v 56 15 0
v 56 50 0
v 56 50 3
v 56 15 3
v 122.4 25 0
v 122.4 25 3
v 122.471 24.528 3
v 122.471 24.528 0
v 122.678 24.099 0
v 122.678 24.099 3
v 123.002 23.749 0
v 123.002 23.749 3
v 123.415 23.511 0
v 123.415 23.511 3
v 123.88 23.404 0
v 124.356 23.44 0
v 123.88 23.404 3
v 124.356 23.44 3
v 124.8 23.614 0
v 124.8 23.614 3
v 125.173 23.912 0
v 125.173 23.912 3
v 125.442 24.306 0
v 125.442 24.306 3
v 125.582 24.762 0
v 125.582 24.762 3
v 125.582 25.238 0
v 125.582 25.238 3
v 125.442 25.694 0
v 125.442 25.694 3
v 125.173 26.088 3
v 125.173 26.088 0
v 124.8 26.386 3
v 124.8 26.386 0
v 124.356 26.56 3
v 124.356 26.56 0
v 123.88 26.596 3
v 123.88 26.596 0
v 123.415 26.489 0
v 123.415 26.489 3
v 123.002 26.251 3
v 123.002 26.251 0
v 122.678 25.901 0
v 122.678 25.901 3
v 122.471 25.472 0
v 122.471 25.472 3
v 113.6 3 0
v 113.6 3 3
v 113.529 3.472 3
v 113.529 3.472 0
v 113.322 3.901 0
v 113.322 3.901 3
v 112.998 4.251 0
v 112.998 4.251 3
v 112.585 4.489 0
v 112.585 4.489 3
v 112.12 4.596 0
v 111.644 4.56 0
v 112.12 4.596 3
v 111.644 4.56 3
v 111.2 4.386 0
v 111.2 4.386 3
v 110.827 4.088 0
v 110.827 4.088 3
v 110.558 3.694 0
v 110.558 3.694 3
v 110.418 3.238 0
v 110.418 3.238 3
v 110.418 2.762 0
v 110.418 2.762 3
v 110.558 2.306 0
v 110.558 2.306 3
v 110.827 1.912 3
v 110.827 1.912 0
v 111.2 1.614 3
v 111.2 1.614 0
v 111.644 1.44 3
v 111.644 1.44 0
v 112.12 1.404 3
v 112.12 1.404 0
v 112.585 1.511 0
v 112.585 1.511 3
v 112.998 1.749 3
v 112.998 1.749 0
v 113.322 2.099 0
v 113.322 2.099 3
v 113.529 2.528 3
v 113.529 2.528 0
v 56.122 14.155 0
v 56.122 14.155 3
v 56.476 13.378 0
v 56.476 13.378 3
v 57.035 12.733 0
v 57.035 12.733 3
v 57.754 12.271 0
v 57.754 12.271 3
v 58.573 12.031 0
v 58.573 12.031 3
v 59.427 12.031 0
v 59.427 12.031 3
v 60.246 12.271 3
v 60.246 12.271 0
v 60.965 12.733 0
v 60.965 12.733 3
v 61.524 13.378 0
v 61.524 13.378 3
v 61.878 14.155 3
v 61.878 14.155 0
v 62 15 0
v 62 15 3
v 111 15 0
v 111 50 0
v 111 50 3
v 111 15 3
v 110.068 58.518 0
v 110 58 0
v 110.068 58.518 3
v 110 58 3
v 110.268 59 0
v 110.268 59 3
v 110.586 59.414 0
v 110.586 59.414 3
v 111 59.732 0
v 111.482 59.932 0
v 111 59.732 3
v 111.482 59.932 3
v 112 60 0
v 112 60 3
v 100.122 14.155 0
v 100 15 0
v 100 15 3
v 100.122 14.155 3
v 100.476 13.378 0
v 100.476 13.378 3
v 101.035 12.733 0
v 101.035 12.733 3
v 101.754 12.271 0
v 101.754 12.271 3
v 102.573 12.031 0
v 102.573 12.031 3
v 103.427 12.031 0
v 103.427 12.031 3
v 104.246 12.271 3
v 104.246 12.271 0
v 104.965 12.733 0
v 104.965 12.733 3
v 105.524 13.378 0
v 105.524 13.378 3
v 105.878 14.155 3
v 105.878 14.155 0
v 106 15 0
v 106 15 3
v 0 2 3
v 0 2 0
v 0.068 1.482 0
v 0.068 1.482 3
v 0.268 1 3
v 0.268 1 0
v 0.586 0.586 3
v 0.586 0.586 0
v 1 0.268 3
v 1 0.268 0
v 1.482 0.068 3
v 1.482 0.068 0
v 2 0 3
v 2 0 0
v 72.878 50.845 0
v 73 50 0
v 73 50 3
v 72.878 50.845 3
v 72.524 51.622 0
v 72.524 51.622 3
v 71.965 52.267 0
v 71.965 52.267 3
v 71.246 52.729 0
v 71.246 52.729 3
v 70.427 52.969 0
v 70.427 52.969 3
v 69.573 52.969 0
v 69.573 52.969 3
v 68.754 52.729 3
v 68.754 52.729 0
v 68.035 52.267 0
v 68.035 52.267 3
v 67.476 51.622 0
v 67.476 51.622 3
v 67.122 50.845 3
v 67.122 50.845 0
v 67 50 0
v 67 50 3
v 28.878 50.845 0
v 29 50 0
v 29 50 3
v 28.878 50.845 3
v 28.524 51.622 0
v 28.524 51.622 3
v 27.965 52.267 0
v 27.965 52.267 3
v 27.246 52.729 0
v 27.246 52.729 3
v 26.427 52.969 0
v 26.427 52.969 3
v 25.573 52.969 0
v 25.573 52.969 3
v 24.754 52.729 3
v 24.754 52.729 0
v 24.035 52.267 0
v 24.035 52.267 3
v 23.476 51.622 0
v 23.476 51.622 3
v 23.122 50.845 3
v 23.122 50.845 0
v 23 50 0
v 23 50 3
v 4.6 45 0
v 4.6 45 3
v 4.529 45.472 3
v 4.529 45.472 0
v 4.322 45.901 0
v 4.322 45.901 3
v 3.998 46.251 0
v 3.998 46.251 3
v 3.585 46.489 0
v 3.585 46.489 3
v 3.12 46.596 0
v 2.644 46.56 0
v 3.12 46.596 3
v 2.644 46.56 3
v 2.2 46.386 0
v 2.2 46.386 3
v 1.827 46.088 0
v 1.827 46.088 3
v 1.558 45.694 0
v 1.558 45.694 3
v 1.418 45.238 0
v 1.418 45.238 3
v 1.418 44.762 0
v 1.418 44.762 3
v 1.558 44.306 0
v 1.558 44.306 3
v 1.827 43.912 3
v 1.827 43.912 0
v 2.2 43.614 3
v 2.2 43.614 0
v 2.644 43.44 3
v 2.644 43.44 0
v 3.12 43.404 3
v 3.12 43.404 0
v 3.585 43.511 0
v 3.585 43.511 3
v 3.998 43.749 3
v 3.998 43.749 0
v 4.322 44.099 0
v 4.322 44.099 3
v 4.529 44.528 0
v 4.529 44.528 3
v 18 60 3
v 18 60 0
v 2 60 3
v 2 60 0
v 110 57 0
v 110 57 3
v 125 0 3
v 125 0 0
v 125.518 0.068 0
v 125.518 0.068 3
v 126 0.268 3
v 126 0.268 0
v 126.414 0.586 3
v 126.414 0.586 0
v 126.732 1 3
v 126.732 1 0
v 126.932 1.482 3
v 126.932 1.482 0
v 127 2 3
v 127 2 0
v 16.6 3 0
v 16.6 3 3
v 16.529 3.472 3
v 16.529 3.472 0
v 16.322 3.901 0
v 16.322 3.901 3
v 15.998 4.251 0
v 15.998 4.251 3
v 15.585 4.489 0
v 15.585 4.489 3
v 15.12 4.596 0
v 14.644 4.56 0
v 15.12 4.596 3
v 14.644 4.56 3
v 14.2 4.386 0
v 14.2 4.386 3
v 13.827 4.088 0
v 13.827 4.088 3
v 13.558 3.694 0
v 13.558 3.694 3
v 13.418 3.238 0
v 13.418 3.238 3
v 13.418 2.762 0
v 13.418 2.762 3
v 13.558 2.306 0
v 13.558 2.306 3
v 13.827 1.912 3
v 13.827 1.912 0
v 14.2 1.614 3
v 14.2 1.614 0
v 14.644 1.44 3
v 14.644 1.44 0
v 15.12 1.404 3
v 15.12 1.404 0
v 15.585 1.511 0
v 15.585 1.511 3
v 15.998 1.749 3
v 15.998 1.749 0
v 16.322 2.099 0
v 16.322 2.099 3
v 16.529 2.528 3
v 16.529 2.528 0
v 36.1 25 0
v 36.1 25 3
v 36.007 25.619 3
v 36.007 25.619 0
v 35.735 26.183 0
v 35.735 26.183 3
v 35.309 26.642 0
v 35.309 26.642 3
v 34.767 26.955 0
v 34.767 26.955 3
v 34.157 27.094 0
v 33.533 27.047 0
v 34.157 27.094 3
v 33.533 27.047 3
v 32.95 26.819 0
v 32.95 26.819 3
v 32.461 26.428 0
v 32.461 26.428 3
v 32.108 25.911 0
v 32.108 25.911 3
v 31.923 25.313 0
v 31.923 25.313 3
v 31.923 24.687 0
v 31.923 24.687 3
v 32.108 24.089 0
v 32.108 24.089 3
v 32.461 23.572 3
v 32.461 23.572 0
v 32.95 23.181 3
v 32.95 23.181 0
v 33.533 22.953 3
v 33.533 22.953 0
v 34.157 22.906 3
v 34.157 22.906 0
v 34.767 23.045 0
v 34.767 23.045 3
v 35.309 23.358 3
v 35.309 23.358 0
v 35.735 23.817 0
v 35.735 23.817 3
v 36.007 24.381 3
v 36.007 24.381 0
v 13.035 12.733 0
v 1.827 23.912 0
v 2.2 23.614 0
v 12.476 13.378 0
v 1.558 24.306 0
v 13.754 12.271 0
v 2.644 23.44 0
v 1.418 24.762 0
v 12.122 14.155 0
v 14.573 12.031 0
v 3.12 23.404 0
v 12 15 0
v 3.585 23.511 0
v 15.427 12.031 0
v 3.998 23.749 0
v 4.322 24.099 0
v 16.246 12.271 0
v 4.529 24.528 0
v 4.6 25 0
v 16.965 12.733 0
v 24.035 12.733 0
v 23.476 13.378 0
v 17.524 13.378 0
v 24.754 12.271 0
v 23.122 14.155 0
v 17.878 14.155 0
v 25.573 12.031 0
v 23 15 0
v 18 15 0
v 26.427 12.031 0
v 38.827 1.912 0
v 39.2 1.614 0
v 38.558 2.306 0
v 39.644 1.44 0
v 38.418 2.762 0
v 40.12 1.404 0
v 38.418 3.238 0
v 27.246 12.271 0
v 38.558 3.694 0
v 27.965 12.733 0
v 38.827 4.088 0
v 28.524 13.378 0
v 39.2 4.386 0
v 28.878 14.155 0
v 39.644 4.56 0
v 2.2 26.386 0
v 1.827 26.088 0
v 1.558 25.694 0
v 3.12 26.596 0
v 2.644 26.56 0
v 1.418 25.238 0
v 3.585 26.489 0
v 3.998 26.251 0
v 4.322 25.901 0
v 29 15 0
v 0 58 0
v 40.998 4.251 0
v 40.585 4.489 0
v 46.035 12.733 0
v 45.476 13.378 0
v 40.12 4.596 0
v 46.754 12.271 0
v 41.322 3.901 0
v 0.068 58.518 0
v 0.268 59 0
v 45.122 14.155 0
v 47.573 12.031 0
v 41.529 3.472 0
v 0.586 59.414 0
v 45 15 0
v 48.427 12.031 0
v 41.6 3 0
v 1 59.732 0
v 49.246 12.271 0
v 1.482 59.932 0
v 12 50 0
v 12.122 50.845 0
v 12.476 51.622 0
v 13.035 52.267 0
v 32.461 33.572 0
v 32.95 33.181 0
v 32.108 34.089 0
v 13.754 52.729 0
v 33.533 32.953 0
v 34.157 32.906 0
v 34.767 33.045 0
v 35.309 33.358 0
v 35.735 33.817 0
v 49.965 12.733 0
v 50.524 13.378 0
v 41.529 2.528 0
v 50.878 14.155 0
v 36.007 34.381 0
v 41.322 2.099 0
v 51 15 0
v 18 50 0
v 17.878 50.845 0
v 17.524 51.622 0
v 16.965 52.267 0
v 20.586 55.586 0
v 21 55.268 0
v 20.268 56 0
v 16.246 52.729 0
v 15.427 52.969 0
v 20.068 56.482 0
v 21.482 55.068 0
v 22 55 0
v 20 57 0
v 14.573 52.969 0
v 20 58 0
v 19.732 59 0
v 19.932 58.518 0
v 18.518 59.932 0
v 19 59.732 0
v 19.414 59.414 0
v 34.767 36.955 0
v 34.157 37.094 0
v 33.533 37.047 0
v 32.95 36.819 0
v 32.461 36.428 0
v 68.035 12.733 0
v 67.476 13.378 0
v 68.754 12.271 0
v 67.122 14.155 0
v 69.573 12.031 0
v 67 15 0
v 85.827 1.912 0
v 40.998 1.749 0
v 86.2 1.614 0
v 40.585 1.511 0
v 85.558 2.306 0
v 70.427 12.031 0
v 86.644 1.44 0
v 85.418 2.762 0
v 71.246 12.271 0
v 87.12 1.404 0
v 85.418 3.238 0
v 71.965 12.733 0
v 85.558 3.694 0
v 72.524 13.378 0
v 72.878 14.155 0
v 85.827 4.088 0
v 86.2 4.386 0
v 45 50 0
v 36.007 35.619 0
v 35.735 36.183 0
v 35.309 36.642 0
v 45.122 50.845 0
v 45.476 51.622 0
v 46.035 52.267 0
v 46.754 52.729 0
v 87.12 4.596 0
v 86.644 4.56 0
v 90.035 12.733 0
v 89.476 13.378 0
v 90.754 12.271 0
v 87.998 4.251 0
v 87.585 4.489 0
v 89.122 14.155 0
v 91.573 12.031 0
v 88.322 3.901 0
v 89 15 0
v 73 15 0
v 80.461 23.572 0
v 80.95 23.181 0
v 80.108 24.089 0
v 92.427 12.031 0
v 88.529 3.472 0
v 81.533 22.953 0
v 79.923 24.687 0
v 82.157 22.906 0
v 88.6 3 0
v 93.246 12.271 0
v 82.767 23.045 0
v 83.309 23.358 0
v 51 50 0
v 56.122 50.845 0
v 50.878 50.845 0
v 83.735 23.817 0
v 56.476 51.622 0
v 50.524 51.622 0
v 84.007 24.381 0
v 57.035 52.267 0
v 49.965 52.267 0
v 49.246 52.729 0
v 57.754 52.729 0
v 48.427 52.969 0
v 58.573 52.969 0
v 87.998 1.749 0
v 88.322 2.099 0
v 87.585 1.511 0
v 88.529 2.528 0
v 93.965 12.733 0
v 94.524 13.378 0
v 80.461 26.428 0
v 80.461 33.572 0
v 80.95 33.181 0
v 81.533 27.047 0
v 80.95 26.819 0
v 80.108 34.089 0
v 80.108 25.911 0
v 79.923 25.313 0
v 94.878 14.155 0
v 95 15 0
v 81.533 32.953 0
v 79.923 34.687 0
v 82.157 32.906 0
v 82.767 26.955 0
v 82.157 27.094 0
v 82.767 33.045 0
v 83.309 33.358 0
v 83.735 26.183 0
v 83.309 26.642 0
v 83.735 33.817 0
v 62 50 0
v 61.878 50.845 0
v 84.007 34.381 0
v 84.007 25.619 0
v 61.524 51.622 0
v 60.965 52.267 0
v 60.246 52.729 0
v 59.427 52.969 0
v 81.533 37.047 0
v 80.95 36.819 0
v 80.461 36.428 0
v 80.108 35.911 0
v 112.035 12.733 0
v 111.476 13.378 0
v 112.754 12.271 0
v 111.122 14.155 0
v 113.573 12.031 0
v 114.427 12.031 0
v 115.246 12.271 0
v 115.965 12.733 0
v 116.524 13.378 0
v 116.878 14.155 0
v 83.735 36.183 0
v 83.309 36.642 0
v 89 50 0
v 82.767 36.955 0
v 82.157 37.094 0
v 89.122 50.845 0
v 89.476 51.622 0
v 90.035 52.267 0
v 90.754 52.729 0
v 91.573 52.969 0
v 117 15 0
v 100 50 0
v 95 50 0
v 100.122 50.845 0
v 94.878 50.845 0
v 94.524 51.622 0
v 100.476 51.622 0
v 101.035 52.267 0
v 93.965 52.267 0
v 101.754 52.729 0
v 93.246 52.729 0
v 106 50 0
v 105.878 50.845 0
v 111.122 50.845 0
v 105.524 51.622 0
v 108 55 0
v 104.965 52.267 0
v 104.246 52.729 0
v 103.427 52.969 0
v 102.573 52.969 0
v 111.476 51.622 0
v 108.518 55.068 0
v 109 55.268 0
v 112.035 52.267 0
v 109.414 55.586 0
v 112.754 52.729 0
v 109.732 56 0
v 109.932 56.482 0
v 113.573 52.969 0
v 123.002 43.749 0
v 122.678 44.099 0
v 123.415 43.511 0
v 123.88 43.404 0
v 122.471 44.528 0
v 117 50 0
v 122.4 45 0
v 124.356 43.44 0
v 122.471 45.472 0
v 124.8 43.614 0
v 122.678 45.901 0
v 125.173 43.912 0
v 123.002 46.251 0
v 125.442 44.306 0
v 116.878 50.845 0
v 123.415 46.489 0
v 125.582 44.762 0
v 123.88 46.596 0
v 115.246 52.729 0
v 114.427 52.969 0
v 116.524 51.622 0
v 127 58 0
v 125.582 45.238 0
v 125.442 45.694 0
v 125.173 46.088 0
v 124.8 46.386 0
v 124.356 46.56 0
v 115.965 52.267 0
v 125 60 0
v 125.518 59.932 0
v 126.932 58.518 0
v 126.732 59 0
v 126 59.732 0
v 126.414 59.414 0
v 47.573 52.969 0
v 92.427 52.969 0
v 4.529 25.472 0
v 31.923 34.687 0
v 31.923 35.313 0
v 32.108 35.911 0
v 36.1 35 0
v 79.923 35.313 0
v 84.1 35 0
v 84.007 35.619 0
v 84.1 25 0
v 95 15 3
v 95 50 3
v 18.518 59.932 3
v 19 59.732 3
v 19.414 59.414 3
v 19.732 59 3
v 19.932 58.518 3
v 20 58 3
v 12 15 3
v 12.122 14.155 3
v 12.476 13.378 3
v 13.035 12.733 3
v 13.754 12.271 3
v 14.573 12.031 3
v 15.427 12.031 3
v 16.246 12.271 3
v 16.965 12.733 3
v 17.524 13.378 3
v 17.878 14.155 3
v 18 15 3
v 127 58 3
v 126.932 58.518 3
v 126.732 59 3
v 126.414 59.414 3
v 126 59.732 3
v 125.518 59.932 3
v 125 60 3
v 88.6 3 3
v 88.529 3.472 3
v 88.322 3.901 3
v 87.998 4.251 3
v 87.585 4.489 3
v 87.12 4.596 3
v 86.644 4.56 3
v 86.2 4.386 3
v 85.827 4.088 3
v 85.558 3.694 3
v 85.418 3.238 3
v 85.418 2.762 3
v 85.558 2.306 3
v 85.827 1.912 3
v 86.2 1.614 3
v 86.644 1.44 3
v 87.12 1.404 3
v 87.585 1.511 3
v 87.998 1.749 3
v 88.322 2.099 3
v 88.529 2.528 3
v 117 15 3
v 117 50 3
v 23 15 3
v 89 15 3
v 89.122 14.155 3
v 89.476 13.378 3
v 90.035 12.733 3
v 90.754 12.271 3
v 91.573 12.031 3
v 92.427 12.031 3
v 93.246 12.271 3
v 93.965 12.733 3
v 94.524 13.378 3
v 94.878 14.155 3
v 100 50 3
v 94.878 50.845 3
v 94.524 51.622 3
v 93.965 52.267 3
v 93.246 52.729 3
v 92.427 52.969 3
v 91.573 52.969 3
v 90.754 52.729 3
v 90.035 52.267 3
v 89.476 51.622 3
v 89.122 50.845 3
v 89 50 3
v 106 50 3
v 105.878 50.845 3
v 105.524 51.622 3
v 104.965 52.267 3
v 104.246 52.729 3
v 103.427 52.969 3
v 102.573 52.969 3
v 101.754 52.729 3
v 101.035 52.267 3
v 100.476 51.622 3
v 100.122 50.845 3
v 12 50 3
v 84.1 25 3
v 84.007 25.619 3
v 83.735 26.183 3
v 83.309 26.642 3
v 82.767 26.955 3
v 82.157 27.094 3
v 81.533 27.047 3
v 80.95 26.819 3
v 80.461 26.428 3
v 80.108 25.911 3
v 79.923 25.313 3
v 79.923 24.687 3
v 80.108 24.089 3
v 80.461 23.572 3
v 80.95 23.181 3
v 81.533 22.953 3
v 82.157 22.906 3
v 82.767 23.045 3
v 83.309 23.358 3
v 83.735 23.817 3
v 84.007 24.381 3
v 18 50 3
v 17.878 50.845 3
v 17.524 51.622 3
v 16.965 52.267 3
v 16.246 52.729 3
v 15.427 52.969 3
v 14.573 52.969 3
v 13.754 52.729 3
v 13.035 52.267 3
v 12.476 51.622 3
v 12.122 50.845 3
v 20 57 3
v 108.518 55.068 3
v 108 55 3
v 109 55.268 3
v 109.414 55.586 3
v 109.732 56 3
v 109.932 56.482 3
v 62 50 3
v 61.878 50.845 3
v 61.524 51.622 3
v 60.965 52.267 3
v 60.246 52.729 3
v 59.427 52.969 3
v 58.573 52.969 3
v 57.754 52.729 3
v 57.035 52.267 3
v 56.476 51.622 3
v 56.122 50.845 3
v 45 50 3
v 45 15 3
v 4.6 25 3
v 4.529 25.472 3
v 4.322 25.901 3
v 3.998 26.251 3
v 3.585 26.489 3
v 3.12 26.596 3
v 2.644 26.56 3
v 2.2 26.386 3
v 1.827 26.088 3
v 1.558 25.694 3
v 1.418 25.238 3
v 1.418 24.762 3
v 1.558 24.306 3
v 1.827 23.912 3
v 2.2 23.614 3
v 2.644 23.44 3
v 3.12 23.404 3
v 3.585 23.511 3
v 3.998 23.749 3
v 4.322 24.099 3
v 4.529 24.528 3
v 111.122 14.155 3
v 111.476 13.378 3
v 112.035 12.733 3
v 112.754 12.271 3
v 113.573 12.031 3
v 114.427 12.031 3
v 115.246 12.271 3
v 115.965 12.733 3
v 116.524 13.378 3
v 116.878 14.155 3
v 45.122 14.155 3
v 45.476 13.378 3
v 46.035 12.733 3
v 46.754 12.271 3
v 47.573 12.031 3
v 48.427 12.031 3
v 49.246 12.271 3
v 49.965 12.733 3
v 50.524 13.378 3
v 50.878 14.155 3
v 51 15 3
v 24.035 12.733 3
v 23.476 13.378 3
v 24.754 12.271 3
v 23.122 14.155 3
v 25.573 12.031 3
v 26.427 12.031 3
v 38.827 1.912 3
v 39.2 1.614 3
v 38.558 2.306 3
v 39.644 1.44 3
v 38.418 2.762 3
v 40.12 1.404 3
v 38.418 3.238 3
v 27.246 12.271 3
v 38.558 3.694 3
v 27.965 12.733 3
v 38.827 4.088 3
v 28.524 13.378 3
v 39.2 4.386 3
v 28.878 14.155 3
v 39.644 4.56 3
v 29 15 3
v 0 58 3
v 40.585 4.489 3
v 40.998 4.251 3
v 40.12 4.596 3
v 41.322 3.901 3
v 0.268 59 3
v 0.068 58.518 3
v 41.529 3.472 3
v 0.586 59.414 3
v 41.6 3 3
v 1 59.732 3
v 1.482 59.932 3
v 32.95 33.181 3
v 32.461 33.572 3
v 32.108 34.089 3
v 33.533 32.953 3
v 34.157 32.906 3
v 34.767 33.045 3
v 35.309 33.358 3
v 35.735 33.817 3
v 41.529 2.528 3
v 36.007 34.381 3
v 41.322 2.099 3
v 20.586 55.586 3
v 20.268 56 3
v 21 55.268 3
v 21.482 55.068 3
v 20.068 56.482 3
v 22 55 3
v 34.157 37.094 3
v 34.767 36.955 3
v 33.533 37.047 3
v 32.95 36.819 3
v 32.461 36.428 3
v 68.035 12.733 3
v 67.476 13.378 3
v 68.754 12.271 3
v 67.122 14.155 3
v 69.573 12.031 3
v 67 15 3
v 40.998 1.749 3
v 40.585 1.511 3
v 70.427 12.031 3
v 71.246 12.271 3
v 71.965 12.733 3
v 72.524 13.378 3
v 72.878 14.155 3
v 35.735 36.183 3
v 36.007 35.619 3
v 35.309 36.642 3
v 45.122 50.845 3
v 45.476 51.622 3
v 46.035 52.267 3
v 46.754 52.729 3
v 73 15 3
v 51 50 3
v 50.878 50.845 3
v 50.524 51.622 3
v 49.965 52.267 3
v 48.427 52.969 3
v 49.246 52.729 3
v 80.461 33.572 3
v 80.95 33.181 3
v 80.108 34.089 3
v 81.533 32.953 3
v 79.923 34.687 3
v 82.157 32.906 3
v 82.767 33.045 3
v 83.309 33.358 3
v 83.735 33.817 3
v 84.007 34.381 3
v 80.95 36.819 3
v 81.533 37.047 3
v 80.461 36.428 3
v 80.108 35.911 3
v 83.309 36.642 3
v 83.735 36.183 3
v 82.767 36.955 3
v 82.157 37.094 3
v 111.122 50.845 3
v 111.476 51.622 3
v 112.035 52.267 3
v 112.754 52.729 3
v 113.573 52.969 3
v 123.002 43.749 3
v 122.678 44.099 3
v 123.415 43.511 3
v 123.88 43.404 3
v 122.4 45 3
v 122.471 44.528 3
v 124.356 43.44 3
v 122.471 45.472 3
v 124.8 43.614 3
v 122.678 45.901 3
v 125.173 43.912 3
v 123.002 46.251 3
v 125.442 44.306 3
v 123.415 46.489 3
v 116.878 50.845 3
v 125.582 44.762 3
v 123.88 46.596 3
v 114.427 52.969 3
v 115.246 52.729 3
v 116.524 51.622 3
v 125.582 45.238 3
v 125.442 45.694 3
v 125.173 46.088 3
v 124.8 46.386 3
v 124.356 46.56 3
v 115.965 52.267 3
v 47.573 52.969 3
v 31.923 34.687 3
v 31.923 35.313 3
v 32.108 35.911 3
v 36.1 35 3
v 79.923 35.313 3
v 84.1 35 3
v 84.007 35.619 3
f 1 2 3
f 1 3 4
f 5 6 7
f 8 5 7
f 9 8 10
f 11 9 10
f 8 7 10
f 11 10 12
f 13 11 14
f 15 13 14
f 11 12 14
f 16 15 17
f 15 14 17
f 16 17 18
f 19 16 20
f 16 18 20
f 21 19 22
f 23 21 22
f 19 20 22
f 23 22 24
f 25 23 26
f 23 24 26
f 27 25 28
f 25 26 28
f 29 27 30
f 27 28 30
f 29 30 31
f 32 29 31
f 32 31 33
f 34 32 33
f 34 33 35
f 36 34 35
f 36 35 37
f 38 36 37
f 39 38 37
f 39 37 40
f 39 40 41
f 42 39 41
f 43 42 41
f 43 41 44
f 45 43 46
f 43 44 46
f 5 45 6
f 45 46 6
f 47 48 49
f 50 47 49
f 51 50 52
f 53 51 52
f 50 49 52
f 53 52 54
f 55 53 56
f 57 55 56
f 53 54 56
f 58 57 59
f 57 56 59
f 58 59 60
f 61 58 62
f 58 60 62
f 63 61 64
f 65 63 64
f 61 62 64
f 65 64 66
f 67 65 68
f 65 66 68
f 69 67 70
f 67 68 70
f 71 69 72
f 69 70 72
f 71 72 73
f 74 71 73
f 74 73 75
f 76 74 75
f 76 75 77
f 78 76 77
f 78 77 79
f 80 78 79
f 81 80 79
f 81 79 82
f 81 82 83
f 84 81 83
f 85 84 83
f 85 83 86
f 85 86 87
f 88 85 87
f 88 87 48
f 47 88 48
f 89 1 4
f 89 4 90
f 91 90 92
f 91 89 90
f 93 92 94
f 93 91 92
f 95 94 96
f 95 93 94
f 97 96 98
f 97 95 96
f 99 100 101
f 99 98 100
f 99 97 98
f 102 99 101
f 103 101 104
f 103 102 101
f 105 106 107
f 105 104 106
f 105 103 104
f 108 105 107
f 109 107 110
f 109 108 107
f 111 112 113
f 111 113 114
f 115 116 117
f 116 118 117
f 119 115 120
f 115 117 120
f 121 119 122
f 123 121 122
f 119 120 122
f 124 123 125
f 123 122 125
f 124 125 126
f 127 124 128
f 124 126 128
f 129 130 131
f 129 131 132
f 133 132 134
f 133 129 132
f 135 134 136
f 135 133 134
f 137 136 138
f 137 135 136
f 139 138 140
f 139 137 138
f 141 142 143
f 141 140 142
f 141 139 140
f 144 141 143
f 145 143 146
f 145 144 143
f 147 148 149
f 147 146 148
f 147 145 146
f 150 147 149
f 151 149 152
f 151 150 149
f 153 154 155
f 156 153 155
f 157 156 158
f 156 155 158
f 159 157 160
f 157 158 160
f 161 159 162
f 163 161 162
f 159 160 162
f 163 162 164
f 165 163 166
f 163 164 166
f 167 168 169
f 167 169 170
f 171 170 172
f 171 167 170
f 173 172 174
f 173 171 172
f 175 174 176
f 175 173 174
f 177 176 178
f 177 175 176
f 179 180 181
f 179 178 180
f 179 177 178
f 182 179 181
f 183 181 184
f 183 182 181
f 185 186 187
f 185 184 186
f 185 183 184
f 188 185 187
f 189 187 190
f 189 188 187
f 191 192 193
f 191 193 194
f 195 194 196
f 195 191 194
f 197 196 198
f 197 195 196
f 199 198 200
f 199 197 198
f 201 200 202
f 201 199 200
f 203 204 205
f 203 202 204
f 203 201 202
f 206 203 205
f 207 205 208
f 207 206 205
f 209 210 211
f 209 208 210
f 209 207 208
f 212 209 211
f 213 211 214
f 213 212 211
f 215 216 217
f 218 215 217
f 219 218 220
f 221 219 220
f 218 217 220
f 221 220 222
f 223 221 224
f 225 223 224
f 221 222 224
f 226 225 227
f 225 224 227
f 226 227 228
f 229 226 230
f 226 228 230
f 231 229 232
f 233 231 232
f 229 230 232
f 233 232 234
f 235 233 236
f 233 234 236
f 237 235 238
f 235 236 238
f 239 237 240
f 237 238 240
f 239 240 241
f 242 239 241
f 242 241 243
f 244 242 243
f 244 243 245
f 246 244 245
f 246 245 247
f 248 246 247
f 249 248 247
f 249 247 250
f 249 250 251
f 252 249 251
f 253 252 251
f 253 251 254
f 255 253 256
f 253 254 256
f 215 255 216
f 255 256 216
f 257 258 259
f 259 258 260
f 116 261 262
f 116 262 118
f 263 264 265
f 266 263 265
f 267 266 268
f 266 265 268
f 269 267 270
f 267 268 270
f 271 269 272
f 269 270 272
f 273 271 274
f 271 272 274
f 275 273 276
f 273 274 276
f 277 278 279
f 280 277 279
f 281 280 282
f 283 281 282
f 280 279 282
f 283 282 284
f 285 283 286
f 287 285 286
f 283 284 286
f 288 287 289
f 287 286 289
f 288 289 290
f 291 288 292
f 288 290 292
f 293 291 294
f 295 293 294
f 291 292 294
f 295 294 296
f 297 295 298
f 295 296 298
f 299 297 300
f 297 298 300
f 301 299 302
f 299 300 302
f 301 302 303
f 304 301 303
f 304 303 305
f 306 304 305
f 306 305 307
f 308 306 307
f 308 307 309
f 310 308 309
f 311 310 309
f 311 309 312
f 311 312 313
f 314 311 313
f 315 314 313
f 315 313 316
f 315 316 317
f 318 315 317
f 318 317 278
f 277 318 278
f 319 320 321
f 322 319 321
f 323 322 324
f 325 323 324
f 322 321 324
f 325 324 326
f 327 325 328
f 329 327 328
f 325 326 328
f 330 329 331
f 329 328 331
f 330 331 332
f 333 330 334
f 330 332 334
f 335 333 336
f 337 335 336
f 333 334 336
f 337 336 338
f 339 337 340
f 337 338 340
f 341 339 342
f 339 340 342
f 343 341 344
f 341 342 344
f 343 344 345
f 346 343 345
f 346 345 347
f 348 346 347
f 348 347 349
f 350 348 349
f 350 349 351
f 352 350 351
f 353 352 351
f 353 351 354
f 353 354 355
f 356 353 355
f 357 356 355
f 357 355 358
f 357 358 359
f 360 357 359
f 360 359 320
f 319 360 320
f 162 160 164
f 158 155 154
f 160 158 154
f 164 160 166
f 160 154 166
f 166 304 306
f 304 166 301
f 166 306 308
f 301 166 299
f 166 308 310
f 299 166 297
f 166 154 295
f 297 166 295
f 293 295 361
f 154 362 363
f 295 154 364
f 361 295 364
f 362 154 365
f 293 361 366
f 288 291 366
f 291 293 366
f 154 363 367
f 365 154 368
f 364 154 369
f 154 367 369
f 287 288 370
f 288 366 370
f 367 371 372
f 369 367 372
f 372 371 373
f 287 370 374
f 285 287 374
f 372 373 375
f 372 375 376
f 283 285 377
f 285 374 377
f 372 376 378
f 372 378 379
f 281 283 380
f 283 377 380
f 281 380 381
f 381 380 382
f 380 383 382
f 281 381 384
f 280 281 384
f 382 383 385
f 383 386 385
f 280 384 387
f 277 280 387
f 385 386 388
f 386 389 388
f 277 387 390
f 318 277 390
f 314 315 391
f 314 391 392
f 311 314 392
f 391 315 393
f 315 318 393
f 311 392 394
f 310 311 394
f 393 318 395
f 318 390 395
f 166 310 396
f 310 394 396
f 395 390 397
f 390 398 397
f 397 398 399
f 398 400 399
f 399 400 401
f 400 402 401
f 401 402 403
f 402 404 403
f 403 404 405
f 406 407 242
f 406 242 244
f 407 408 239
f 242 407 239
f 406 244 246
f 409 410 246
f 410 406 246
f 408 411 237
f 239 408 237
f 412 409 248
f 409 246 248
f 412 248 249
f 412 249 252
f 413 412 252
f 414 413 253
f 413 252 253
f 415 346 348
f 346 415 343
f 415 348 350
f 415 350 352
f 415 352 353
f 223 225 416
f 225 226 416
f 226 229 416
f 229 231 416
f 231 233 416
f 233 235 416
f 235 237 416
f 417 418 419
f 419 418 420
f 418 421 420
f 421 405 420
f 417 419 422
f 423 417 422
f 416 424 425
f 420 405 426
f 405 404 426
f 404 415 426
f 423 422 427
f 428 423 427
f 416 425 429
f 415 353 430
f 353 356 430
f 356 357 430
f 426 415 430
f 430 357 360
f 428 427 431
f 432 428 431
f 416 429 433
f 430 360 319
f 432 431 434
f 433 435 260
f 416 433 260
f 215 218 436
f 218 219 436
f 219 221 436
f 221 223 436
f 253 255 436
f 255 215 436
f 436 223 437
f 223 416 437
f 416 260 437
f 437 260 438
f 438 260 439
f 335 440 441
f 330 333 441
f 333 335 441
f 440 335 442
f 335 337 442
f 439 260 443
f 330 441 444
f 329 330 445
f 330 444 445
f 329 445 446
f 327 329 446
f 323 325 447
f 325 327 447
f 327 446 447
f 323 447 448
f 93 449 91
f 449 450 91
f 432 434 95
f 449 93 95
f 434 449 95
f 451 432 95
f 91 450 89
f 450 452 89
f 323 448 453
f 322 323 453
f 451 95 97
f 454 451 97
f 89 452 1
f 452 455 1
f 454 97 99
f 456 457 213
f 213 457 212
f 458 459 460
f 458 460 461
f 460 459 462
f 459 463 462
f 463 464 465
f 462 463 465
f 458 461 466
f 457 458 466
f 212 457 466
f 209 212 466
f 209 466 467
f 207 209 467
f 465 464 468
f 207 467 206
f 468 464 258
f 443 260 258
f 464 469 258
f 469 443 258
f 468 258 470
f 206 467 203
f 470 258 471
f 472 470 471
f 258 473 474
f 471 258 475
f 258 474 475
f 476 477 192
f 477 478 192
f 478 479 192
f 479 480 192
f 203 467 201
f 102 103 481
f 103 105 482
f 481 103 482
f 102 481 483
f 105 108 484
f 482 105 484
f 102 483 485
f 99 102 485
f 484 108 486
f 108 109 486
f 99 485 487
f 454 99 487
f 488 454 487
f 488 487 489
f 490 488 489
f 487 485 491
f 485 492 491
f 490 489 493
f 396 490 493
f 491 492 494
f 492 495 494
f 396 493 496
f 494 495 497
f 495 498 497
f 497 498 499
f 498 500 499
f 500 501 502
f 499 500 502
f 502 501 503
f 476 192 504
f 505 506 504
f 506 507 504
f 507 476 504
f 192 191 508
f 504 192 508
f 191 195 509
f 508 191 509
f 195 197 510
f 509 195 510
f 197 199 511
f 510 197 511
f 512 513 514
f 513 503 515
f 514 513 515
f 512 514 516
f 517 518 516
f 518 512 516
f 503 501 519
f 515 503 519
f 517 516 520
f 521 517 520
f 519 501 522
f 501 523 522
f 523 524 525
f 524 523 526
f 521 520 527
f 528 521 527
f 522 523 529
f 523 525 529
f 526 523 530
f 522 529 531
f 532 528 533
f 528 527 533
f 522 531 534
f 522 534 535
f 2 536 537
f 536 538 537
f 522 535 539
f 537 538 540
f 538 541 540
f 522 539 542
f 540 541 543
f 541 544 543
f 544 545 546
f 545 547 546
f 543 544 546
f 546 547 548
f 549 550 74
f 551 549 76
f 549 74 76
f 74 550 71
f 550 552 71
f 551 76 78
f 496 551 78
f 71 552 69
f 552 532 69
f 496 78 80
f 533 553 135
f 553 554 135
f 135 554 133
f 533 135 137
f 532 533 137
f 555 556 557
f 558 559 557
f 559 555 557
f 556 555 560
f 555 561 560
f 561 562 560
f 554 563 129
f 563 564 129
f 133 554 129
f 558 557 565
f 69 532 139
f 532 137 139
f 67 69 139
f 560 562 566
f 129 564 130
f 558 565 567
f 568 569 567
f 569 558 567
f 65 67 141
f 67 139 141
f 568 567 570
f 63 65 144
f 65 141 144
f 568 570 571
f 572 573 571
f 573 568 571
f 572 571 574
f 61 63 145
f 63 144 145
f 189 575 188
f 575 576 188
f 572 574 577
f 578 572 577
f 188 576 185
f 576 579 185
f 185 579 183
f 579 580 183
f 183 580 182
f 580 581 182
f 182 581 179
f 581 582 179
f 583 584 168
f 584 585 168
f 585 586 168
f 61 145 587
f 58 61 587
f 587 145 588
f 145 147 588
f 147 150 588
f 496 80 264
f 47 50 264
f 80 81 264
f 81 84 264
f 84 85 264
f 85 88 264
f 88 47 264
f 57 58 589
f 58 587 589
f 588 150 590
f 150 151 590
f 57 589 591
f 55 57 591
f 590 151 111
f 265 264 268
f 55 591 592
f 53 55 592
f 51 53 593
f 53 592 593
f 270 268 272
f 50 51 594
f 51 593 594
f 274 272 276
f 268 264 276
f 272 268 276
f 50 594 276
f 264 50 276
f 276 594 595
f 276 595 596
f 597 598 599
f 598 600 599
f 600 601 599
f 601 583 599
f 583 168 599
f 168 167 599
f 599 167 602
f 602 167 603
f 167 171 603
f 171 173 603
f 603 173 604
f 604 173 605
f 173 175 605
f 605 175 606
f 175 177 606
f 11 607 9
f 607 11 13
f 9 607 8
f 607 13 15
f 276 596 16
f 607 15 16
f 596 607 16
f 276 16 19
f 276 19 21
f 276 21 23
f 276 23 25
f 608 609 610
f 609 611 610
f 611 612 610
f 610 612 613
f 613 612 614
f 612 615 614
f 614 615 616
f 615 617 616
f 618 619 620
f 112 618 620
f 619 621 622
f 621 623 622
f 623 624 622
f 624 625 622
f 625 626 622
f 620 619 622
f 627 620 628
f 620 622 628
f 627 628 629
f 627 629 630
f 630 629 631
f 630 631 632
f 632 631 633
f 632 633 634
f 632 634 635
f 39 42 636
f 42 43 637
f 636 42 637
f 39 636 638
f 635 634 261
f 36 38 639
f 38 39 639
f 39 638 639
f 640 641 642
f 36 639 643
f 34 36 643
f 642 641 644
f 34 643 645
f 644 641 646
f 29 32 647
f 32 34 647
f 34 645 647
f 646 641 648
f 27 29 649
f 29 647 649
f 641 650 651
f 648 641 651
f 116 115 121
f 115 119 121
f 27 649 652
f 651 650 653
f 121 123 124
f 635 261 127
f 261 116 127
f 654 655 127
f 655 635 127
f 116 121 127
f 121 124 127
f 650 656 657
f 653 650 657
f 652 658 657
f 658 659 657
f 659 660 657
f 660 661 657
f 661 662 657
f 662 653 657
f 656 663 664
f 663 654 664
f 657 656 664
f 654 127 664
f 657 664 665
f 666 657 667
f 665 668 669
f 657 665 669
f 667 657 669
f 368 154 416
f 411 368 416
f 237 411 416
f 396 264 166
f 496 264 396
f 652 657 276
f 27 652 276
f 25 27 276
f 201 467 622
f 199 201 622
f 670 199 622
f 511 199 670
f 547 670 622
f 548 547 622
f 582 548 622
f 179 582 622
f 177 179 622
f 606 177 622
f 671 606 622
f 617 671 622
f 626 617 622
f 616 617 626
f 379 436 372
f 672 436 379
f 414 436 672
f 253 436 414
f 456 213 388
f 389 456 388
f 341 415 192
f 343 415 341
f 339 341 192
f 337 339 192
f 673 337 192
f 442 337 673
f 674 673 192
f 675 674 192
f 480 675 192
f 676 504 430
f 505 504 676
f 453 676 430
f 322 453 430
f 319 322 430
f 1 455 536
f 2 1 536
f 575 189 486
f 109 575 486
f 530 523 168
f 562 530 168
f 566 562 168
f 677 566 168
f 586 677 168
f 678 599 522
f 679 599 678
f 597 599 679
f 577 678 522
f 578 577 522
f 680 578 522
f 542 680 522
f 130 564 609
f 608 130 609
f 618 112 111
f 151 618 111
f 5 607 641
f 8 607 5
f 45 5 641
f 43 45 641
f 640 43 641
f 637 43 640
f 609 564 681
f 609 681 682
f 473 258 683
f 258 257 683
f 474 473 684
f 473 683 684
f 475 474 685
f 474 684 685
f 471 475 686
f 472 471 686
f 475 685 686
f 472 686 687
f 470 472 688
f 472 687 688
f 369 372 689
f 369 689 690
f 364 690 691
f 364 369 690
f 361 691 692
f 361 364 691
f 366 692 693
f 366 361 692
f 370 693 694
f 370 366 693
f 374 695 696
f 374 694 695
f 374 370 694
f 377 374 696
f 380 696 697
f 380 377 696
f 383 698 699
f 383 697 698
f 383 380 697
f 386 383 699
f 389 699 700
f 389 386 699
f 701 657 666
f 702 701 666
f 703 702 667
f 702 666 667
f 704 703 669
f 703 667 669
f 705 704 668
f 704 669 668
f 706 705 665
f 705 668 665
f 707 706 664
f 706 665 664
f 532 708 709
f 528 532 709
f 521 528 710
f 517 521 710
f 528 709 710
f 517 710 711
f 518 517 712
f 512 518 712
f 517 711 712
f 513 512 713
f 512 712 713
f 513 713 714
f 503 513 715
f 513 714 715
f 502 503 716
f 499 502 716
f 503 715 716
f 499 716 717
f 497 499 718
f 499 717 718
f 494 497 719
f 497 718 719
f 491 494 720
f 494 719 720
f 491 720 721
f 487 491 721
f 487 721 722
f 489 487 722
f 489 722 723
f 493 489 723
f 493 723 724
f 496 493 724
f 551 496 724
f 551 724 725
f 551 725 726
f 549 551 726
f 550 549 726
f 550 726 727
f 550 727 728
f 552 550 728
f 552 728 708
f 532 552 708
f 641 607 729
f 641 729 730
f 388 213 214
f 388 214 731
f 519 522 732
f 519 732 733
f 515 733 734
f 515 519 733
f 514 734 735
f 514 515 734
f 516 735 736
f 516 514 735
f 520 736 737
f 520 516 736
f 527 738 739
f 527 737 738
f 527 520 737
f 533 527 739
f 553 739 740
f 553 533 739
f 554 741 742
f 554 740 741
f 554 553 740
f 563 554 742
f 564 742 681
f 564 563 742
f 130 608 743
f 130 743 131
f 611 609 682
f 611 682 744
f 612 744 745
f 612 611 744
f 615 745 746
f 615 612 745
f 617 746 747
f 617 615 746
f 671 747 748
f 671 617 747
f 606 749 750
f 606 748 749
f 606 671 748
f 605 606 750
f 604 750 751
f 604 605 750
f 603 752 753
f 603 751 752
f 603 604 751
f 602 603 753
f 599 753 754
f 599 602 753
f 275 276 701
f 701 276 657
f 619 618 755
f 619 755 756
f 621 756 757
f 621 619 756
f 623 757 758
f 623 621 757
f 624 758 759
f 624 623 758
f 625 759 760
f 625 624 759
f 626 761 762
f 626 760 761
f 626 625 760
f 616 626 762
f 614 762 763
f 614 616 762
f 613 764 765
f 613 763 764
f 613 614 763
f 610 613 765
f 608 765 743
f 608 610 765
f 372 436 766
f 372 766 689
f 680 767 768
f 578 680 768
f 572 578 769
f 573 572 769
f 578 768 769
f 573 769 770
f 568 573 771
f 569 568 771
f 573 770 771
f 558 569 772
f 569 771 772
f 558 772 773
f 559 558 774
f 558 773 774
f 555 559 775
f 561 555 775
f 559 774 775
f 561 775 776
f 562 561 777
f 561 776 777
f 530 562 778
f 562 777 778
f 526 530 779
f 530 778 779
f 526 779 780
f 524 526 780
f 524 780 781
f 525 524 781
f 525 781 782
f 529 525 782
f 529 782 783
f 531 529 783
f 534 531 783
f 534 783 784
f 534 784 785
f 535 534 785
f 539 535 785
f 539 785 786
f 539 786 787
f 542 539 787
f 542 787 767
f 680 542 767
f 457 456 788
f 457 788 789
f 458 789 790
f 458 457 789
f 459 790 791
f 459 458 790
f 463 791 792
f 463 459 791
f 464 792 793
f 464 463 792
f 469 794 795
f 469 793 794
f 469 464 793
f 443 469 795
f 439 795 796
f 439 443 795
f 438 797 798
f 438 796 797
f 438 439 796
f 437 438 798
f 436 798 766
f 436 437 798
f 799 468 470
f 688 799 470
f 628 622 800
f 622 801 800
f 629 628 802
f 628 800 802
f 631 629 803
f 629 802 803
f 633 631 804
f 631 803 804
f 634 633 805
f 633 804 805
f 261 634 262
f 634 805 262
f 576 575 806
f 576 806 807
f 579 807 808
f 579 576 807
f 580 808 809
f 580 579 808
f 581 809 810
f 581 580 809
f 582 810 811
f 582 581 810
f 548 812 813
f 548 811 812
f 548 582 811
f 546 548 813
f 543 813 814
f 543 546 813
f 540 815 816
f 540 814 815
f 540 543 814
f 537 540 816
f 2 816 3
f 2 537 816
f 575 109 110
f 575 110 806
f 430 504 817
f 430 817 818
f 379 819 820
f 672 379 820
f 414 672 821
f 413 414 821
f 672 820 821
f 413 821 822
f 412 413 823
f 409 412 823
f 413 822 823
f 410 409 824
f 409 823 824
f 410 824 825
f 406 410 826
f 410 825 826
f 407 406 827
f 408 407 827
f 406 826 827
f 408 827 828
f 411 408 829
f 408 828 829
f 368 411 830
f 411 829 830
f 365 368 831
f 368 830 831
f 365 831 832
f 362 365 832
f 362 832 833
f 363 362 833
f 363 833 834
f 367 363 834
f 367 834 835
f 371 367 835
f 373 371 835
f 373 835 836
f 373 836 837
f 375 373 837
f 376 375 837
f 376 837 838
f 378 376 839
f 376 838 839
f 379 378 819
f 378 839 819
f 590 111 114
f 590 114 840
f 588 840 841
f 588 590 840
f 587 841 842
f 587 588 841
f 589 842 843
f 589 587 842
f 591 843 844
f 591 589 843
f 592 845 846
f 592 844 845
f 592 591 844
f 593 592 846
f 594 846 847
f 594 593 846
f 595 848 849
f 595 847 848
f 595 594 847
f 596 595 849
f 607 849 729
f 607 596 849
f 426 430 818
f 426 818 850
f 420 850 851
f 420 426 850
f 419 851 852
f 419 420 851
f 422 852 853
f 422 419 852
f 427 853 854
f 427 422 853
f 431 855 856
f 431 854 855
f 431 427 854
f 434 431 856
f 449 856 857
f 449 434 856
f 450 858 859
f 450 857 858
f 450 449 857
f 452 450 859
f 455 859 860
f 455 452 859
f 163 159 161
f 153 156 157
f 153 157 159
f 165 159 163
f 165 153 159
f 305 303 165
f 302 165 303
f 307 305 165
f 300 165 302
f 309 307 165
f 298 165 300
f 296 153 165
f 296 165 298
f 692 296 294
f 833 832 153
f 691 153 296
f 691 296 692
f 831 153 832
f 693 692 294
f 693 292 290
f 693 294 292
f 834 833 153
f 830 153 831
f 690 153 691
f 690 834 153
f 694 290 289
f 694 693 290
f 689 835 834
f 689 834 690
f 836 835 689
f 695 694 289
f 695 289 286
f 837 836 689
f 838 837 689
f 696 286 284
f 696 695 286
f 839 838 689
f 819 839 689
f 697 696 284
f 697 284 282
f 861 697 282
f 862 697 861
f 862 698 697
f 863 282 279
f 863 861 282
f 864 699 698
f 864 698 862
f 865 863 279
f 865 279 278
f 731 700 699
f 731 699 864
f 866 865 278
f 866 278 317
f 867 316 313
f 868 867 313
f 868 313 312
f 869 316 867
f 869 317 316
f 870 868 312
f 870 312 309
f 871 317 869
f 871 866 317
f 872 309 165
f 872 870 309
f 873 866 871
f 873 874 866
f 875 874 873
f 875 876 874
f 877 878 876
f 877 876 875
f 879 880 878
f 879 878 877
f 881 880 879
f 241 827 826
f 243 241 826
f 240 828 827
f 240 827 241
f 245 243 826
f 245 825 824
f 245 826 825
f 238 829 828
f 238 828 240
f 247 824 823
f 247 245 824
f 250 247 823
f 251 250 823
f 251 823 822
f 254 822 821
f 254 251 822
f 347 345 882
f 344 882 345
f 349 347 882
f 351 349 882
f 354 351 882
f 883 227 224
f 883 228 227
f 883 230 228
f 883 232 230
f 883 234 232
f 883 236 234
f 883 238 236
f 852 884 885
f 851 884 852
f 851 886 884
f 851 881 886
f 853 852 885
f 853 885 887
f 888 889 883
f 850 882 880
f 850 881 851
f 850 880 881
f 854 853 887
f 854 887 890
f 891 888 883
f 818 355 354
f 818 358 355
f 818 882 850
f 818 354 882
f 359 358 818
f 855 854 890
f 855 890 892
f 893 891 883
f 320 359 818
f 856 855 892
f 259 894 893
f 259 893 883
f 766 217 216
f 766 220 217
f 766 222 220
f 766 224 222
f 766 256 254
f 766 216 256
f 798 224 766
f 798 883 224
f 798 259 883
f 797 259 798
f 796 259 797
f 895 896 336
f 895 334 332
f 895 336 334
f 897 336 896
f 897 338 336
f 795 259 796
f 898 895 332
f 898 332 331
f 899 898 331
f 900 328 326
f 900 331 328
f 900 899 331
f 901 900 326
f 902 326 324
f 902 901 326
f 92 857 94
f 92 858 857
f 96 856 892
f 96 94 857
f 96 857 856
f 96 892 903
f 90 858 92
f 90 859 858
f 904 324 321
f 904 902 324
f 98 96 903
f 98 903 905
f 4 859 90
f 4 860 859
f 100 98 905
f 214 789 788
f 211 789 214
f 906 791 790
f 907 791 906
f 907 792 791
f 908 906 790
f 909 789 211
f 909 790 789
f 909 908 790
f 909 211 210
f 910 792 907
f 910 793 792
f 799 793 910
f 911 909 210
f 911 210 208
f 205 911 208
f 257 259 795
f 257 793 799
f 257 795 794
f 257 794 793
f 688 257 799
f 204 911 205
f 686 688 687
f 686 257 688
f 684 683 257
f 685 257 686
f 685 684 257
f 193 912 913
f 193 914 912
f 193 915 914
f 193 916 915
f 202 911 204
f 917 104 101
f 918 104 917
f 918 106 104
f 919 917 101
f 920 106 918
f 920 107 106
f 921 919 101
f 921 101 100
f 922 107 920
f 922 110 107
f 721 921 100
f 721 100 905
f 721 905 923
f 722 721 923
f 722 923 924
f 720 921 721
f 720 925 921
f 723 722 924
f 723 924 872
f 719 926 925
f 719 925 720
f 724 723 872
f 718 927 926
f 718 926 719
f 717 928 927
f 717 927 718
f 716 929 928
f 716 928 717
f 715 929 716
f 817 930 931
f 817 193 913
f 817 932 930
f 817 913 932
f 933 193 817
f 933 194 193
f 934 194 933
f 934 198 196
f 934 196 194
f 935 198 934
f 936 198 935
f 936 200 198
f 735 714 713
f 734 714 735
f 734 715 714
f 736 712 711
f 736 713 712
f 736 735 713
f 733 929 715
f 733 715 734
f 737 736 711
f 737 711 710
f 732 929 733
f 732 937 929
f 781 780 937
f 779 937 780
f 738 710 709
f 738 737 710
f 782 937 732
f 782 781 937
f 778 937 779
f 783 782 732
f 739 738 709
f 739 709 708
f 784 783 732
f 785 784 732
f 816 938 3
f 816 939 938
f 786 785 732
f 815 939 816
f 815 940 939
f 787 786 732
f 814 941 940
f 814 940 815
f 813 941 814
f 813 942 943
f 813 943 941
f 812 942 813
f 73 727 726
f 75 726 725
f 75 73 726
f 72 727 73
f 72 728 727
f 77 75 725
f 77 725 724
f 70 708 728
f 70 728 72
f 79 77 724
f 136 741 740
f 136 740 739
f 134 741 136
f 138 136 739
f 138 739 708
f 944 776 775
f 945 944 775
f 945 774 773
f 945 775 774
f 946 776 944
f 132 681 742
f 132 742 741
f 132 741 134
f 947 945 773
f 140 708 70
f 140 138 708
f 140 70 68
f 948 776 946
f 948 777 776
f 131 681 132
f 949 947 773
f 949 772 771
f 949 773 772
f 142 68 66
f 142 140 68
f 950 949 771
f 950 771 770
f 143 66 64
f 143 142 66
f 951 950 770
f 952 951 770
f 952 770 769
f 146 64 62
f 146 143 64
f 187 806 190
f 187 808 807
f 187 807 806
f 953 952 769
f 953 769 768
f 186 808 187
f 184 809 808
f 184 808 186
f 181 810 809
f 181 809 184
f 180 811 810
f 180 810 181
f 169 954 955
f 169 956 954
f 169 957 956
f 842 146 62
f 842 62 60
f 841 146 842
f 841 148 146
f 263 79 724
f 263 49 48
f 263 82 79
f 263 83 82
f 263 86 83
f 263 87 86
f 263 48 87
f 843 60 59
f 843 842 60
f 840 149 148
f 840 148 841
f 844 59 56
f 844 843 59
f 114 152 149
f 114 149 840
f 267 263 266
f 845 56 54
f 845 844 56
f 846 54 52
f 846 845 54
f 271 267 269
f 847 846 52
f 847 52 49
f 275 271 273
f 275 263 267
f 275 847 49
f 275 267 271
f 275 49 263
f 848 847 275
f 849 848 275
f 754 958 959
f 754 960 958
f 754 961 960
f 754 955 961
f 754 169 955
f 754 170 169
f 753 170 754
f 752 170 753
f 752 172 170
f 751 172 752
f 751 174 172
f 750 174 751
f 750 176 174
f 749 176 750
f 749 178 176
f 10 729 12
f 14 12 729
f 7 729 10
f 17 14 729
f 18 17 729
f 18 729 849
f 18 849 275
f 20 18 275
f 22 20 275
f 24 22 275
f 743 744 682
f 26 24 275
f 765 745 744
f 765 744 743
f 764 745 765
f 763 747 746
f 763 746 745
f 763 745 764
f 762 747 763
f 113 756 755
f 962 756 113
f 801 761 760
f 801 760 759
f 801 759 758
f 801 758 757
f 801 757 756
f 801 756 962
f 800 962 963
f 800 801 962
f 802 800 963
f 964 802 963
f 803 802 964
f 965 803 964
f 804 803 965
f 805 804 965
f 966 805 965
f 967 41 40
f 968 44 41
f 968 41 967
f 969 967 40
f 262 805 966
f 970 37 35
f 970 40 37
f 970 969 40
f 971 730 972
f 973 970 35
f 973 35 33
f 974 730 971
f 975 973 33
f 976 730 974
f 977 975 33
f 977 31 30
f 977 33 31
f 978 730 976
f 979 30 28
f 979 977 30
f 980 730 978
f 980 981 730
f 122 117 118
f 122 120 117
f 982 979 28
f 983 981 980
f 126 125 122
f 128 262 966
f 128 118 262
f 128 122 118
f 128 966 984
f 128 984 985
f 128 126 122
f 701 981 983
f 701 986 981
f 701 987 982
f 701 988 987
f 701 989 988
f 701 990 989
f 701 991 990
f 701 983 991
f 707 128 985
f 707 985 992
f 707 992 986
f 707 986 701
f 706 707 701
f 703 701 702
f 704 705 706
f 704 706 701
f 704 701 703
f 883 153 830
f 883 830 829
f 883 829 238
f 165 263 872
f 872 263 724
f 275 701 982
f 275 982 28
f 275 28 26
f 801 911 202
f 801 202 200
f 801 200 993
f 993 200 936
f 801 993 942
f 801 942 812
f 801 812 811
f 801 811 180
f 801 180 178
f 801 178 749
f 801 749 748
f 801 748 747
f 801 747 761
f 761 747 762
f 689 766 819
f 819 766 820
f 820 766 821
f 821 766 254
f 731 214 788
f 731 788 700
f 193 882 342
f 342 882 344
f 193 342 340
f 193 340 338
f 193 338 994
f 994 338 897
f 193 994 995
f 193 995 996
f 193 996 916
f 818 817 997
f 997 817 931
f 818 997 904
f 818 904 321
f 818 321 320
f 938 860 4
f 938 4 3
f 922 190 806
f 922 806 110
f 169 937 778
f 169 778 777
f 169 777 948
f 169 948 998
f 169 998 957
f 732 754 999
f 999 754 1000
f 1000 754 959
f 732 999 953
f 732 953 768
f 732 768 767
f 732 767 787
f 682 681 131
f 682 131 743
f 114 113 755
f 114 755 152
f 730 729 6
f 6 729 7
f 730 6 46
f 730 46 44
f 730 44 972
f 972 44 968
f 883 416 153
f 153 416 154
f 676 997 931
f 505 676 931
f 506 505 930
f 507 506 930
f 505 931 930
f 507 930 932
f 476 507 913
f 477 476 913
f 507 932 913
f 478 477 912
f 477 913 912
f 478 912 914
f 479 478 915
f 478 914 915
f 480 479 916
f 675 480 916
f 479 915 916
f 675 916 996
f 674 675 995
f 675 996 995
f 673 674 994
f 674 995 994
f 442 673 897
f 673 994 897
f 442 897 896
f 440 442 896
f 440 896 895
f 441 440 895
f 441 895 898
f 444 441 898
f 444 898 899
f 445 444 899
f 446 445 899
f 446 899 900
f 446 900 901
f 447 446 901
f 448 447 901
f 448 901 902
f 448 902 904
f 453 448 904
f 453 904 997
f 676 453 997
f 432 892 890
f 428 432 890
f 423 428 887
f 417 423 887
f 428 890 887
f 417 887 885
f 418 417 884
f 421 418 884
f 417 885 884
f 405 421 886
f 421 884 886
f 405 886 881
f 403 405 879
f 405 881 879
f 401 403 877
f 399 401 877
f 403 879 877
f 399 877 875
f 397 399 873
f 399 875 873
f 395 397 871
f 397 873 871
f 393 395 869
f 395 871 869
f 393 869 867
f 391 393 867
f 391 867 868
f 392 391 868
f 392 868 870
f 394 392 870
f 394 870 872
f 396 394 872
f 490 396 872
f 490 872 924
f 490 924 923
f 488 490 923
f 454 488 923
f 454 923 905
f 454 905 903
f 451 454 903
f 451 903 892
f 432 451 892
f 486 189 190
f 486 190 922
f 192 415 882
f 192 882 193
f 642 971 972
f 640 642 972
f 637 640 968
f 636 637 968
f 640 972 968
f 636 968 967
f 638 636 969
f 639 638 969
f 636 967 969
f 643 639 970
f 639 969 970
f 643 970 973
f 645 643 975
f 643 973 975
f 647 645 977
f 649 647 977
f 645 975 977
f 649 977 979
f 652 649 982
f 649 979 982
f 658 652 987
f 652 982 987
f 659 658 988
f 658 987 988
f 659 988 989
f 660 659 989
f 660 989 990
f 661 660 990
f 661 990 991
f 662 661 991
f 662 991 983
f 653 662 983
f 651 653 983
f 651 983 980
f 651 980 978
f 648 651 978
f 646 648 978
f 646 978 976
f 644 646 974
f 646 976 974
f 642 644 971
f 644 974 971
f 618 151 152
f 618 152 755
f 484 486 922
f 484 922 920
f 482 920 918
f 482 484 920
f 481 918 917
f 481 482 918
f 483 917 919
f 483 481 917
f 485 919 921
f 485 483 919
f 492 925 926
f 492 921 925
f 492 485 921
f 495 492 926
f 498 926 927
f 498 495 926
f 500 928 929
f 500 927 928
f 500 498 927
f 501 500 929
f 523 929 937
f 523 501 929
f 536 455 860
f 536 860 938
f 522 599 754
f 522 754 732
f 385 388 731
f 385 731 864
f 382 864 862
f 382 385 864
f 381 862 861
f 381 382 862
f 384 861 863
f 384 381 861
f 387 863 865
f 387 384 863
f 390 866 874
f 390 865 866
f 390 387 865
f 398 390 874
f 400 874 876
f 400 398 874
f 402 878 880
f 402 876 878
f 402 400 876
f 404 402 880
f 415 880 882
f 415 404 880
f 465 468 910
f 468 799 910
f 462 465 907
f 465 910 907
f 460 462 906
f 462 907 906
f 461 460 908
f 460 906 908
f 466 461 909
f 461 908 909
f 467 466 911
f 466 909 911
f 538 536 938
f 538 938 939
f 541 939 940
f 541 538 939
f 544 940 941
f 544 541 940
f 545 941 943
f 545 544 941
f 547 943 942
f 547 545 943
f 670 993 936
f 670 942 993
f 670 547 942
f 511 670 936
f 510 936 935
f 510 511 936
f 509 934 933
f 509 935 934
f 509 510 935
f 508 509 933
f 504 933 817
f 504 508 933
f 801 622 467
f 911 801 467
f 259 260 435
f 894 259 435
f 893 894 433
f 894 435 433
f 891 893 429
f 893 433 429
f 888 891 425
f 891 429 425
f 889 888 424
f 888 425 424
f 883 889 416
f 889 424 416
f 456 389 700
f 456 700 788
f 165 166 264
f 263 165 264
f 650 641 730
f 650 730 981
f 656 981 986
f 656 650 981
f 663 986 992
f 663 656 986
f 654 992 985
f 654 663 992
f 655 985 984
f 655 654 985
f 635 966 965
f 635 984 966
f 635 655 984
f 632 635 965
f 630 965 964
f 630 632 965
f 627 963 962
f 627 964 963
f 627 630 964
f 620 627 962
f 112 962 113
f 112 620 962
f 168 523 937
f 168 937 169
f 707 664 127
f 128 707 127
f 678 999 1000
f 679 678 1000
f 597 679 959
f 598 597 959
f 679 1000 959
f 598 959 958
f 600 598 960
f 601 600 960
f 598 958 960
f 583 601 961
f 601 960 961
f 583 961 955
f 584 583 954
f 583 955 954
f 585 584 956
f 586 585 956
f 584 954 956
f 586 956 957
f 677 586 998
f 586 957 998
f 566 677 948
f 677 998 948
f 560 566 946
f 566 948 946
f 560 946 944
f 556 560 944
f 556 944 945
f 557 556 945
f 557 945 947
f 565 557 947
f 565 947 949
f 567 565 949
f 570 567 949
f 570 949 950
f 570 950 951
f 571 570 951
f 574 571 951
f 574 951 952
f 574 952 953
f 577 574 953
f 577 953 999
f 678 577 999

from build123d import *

# Parameters (mm, degrees)
EXTRUDE_1_DEPTH     = 3
CUT_EXTRUDE_1_REACH = 142.492
SKETCH_2_R          = 1.6
SKETCH_3_R          = 1.6
CUT_EXTRUDE_2_DEPTH = 3
SKETCH_4_R          = 2.1
CUT_EXTRUDE_3_DEPTH = 10
CUT_EXTRUDE_4_DEPTH = 10
SKETCH_6_W          = 90
SKETCH_6_H          = 5
CUT_EXTRUDE_5_DEPTH = 10
FILLET_1_R          = 2


with BuildPart() as part:
    # 草图1 → 凸台-拉伸1 (new body)
    with BuildSketch(Plane.XY):
        with BuildLine():
            Line((2, 0), (125, 0))
            ThreePointArc((125, 0), (126.414213562, 0.585786438), (127, 2))
            Line((127, 2), (127, 58))
            ThreePointArc((127, 58), (126.414213562, 59.414213562), (125, 60))
            Line((125, 60), (2, 60))
            ThreePointArc((2, 60), (0.585786438, 59.414213562), (0, 58))
            Line((0, 58), (0, 2))
            ThreePointArc((0, 2), (0.585786438, 0.585786438), (2, 0))
        make_face()
    extrude(amount=EXTRUDE_1_DEPTH)

    # 草图2 → 切除-拉伸1 (cut, up to next)
    with BuildSketch(Plane.XY.offset(3), mode=Mode.PRIVATE) as cut_extrude_1_sk1:
        with Locations((15, 3)):
            Circle(SKETCH_2_R)
    cut_extrude_1_tool1 = extrude(cut_extrude_1_sk1.sketch, amount=-CUT_EXTRUDE_1_REACH, mode=Mode.PRIVATE) & part.part
    # 草图2 → 切除-拉伸1 (cut, up to next)
    with BuildSketch(Plane.XY.offset(3), mode=Mode.PRIVATE) as cut_extrude_1_sk2:
        with Locations((40, 3)):
            Circle(SKETCH_2_R)
    cut_extrude_1_tool2 = extrude(cut_extrude_1_sk2.sketch, amount=-CUT_EXTRUDE_1_REACH, mode=Mode.PRIVATE) & part.part
    # 草图2 → 切除-拉伸1 (cut, up to next)
    with BuildSketch(Plane.XY.offset(3), mode=Mode.PRIVATE) as cut_extrude_1_sk3:
        with Locations((87, 3)):
            Circle(SKETCH_2_R)
    cut_extrude_1_tool3 = extrude(cut_extrude_1_sk3.sketch, amount=-CUT_EXTRUDE_1_REACH, mode=Mode.PRIVATE) & part.part
    # 草图2 → 切除-拉伸1 (cut, up to next)
    with BuildSketch(Plane.XY.offset(3), mode=Mode.PRIVATE) as cut_extrude_1_sk4:
        with Locations((112, 3)):
            Circle(SKETCH_2_R)
    cut_extrude_1_tool4 = extrude(cut_extrude_1_sk4.sketch, amount=-CUT_EXTRUDE_1_REACH, mode=Mode.PRIVATE) & part.part
    add(cut_extrude_1_tool1.solids().sort_by_distance((15, 3, 3))[0], mode=Mode.SUBTRACT)
    add(cut_extrude_1_tool2.solids().sort_by_distance((40, 3, 3))[0], mode=Mode.SUBTRACT)
    add(cut_extrude_1_tool3.solids().sort_by_distance((87, 3, 3))[0], mode=Mode.SUBTRACT)
    add(cut_extrude_1_tool4.solids().sort_by_distance((112, 3, 3))[0], mode=Mode.SUBTRACT)

    # 草图3 → 切除-拉伸2 (cut)
    with BuildSketch(Plane.XY.offset(3)):
        with Locations((3, 45)):
            Circle(SKETCH_3_R)
        with Locations((3, 25)):
            Circle(SKETCH_3_R)
        with Locations(Location((124, 25, 0), (0, 0, 180))):
            Circle(SKETCH_3_R)
        with Locations(Location((124, 45, 0), (0, 0, 180))):
            Circle(SKETCH_3_R)
    extrude(amount=-CUT_EXTRUDE_2_DEPTH, mode=Mode.SUBTRACT)

    # 草图4 → 切除-拉伸3 (cut)
    with BuildSketch(Plane.XY.offset(3)):
        with Locations((82, 35)):
            Circle(SKETCH_4_R)
        with Locations((34, 35)):
            Circle(SKETCH_4_R)
        with Locations((34, 25)):
            Circle(SKETCH_4_R)
        with Locations((82, 25)):
            Circle(SKETCH_4_R)
    extrude(amount=-CUT_EXTRUDE_3_DEPTH, mode=Mode.SUBTRACT)

    # 草图5 → 切除-拉伸4 (cut)
    with BuildSketch(Plane(origin=(0, 0, 0), x_dir=(-1, 0, 0), z_dir=(0, 0, -1))):
        with BuildLine():
            Line((-111, 50), (-111, 15))
            ThreePointArc((-111, 15), (-114, 12), (-117, 15))
            Line((-117, 15), (-117, 50))
            ThreePointArc((-117, 50), (-114, 53), (-111, 50))
        make_face()
        with BuildLine():
            Line((-100, 50), (-100, 15))
            ThreePointArc((-100, 15), (-103, 12), (-106, 15))
            Line((-106, 15), (-106, 50))
            ThreePointArc((-106, 50), (-103, 53), (-100, 50))
        make_face()
        with BuildLine():
            Line((-89, 50), (-89, 15))
            ThreePointArc((-89, 15), (-92, 12), (-95, 15))
            Line((-95, 15), (-95, 50))
            ThreePointArc((-95, 50), (-92, 53), (-89, 50))
        make_face()
        with BuildLine():
            Line((-67, 50), (-67, 15))
            ThreePointArc((-67, 15), (-70, 12), (-73, 15))
            Line((-73, 15), (-73, 50))
            ThreePointArc((-73, 50), (-70, 53), (-67, 50))
        make_face()
        with BuildLine():
            Line((-56, 50), (-56, 15))
            ThreePointArc((-56, 15), (-59, 12), (-62, 15))
            Line((-62, 15), (-62, 50))
            ThreePointArc((-62, 50), (-59, 53), (-56, 50))
        make_face()
        with BuildLine():
            Line((-45, 50), (-45, 15))
            ThreePointArc((-45, 15), (-48, 12), (-51, 15))
            Line((-51, 15), (-51, 50))
            ThreePointArc((-51, 50), (-48, 53), (-45, 50))
        make_face()
        with BuildLine():
            Line((-23, 50), (-23, 15))
            ThreePointArc((-23, 15), (-26, 12), (-29, 15))
            Line((-29, 15), (-29, 50))
            ThreePointArc((-29, 50), (-26, 53), (-23, 50))
        make_face()
        with BuildLine():
            Line((-12, 50), (-12, 15))
            ThreePointArc((-12, 15), (-15, 12), (-18, 15))
            Line((-18, 15), (-18, 50))
            ThreePointArc((-18, 50), (-15, 53), (-12, 50))
        make_face()
    extrude(amount=-CUT_EXTRUDE_4_DEPTH, mode=Mode.SUBTRACT)

    # 草图6 → 切除-拉伸5 (cut)
    with BuildSketch(Plane(origin=(0, 0, 0), x_dir=(-1, 0, 0), z_dir=(0, 0, -1))):
        with Locations((-65, 57.5)):
            Rectangle(SKETCH_6_W, SKETCH_6_H)
    extrude(amount=-CUT_EXTRUDE_5_DEPTH, mode=Mode.SUBTRACT)

    # 圆角1
    fillet_1_edges = [part.edges().sort_by_distance(p)[0] for p in [
        (110, 55, 1.5),
        (110, 60, 1.5),
        (20, 60, 1.5),
        (20, 55, 1.5),
    ]]
    fillet(fillet_1_edges, radius=FILLET_1_R)


solid = part.part
